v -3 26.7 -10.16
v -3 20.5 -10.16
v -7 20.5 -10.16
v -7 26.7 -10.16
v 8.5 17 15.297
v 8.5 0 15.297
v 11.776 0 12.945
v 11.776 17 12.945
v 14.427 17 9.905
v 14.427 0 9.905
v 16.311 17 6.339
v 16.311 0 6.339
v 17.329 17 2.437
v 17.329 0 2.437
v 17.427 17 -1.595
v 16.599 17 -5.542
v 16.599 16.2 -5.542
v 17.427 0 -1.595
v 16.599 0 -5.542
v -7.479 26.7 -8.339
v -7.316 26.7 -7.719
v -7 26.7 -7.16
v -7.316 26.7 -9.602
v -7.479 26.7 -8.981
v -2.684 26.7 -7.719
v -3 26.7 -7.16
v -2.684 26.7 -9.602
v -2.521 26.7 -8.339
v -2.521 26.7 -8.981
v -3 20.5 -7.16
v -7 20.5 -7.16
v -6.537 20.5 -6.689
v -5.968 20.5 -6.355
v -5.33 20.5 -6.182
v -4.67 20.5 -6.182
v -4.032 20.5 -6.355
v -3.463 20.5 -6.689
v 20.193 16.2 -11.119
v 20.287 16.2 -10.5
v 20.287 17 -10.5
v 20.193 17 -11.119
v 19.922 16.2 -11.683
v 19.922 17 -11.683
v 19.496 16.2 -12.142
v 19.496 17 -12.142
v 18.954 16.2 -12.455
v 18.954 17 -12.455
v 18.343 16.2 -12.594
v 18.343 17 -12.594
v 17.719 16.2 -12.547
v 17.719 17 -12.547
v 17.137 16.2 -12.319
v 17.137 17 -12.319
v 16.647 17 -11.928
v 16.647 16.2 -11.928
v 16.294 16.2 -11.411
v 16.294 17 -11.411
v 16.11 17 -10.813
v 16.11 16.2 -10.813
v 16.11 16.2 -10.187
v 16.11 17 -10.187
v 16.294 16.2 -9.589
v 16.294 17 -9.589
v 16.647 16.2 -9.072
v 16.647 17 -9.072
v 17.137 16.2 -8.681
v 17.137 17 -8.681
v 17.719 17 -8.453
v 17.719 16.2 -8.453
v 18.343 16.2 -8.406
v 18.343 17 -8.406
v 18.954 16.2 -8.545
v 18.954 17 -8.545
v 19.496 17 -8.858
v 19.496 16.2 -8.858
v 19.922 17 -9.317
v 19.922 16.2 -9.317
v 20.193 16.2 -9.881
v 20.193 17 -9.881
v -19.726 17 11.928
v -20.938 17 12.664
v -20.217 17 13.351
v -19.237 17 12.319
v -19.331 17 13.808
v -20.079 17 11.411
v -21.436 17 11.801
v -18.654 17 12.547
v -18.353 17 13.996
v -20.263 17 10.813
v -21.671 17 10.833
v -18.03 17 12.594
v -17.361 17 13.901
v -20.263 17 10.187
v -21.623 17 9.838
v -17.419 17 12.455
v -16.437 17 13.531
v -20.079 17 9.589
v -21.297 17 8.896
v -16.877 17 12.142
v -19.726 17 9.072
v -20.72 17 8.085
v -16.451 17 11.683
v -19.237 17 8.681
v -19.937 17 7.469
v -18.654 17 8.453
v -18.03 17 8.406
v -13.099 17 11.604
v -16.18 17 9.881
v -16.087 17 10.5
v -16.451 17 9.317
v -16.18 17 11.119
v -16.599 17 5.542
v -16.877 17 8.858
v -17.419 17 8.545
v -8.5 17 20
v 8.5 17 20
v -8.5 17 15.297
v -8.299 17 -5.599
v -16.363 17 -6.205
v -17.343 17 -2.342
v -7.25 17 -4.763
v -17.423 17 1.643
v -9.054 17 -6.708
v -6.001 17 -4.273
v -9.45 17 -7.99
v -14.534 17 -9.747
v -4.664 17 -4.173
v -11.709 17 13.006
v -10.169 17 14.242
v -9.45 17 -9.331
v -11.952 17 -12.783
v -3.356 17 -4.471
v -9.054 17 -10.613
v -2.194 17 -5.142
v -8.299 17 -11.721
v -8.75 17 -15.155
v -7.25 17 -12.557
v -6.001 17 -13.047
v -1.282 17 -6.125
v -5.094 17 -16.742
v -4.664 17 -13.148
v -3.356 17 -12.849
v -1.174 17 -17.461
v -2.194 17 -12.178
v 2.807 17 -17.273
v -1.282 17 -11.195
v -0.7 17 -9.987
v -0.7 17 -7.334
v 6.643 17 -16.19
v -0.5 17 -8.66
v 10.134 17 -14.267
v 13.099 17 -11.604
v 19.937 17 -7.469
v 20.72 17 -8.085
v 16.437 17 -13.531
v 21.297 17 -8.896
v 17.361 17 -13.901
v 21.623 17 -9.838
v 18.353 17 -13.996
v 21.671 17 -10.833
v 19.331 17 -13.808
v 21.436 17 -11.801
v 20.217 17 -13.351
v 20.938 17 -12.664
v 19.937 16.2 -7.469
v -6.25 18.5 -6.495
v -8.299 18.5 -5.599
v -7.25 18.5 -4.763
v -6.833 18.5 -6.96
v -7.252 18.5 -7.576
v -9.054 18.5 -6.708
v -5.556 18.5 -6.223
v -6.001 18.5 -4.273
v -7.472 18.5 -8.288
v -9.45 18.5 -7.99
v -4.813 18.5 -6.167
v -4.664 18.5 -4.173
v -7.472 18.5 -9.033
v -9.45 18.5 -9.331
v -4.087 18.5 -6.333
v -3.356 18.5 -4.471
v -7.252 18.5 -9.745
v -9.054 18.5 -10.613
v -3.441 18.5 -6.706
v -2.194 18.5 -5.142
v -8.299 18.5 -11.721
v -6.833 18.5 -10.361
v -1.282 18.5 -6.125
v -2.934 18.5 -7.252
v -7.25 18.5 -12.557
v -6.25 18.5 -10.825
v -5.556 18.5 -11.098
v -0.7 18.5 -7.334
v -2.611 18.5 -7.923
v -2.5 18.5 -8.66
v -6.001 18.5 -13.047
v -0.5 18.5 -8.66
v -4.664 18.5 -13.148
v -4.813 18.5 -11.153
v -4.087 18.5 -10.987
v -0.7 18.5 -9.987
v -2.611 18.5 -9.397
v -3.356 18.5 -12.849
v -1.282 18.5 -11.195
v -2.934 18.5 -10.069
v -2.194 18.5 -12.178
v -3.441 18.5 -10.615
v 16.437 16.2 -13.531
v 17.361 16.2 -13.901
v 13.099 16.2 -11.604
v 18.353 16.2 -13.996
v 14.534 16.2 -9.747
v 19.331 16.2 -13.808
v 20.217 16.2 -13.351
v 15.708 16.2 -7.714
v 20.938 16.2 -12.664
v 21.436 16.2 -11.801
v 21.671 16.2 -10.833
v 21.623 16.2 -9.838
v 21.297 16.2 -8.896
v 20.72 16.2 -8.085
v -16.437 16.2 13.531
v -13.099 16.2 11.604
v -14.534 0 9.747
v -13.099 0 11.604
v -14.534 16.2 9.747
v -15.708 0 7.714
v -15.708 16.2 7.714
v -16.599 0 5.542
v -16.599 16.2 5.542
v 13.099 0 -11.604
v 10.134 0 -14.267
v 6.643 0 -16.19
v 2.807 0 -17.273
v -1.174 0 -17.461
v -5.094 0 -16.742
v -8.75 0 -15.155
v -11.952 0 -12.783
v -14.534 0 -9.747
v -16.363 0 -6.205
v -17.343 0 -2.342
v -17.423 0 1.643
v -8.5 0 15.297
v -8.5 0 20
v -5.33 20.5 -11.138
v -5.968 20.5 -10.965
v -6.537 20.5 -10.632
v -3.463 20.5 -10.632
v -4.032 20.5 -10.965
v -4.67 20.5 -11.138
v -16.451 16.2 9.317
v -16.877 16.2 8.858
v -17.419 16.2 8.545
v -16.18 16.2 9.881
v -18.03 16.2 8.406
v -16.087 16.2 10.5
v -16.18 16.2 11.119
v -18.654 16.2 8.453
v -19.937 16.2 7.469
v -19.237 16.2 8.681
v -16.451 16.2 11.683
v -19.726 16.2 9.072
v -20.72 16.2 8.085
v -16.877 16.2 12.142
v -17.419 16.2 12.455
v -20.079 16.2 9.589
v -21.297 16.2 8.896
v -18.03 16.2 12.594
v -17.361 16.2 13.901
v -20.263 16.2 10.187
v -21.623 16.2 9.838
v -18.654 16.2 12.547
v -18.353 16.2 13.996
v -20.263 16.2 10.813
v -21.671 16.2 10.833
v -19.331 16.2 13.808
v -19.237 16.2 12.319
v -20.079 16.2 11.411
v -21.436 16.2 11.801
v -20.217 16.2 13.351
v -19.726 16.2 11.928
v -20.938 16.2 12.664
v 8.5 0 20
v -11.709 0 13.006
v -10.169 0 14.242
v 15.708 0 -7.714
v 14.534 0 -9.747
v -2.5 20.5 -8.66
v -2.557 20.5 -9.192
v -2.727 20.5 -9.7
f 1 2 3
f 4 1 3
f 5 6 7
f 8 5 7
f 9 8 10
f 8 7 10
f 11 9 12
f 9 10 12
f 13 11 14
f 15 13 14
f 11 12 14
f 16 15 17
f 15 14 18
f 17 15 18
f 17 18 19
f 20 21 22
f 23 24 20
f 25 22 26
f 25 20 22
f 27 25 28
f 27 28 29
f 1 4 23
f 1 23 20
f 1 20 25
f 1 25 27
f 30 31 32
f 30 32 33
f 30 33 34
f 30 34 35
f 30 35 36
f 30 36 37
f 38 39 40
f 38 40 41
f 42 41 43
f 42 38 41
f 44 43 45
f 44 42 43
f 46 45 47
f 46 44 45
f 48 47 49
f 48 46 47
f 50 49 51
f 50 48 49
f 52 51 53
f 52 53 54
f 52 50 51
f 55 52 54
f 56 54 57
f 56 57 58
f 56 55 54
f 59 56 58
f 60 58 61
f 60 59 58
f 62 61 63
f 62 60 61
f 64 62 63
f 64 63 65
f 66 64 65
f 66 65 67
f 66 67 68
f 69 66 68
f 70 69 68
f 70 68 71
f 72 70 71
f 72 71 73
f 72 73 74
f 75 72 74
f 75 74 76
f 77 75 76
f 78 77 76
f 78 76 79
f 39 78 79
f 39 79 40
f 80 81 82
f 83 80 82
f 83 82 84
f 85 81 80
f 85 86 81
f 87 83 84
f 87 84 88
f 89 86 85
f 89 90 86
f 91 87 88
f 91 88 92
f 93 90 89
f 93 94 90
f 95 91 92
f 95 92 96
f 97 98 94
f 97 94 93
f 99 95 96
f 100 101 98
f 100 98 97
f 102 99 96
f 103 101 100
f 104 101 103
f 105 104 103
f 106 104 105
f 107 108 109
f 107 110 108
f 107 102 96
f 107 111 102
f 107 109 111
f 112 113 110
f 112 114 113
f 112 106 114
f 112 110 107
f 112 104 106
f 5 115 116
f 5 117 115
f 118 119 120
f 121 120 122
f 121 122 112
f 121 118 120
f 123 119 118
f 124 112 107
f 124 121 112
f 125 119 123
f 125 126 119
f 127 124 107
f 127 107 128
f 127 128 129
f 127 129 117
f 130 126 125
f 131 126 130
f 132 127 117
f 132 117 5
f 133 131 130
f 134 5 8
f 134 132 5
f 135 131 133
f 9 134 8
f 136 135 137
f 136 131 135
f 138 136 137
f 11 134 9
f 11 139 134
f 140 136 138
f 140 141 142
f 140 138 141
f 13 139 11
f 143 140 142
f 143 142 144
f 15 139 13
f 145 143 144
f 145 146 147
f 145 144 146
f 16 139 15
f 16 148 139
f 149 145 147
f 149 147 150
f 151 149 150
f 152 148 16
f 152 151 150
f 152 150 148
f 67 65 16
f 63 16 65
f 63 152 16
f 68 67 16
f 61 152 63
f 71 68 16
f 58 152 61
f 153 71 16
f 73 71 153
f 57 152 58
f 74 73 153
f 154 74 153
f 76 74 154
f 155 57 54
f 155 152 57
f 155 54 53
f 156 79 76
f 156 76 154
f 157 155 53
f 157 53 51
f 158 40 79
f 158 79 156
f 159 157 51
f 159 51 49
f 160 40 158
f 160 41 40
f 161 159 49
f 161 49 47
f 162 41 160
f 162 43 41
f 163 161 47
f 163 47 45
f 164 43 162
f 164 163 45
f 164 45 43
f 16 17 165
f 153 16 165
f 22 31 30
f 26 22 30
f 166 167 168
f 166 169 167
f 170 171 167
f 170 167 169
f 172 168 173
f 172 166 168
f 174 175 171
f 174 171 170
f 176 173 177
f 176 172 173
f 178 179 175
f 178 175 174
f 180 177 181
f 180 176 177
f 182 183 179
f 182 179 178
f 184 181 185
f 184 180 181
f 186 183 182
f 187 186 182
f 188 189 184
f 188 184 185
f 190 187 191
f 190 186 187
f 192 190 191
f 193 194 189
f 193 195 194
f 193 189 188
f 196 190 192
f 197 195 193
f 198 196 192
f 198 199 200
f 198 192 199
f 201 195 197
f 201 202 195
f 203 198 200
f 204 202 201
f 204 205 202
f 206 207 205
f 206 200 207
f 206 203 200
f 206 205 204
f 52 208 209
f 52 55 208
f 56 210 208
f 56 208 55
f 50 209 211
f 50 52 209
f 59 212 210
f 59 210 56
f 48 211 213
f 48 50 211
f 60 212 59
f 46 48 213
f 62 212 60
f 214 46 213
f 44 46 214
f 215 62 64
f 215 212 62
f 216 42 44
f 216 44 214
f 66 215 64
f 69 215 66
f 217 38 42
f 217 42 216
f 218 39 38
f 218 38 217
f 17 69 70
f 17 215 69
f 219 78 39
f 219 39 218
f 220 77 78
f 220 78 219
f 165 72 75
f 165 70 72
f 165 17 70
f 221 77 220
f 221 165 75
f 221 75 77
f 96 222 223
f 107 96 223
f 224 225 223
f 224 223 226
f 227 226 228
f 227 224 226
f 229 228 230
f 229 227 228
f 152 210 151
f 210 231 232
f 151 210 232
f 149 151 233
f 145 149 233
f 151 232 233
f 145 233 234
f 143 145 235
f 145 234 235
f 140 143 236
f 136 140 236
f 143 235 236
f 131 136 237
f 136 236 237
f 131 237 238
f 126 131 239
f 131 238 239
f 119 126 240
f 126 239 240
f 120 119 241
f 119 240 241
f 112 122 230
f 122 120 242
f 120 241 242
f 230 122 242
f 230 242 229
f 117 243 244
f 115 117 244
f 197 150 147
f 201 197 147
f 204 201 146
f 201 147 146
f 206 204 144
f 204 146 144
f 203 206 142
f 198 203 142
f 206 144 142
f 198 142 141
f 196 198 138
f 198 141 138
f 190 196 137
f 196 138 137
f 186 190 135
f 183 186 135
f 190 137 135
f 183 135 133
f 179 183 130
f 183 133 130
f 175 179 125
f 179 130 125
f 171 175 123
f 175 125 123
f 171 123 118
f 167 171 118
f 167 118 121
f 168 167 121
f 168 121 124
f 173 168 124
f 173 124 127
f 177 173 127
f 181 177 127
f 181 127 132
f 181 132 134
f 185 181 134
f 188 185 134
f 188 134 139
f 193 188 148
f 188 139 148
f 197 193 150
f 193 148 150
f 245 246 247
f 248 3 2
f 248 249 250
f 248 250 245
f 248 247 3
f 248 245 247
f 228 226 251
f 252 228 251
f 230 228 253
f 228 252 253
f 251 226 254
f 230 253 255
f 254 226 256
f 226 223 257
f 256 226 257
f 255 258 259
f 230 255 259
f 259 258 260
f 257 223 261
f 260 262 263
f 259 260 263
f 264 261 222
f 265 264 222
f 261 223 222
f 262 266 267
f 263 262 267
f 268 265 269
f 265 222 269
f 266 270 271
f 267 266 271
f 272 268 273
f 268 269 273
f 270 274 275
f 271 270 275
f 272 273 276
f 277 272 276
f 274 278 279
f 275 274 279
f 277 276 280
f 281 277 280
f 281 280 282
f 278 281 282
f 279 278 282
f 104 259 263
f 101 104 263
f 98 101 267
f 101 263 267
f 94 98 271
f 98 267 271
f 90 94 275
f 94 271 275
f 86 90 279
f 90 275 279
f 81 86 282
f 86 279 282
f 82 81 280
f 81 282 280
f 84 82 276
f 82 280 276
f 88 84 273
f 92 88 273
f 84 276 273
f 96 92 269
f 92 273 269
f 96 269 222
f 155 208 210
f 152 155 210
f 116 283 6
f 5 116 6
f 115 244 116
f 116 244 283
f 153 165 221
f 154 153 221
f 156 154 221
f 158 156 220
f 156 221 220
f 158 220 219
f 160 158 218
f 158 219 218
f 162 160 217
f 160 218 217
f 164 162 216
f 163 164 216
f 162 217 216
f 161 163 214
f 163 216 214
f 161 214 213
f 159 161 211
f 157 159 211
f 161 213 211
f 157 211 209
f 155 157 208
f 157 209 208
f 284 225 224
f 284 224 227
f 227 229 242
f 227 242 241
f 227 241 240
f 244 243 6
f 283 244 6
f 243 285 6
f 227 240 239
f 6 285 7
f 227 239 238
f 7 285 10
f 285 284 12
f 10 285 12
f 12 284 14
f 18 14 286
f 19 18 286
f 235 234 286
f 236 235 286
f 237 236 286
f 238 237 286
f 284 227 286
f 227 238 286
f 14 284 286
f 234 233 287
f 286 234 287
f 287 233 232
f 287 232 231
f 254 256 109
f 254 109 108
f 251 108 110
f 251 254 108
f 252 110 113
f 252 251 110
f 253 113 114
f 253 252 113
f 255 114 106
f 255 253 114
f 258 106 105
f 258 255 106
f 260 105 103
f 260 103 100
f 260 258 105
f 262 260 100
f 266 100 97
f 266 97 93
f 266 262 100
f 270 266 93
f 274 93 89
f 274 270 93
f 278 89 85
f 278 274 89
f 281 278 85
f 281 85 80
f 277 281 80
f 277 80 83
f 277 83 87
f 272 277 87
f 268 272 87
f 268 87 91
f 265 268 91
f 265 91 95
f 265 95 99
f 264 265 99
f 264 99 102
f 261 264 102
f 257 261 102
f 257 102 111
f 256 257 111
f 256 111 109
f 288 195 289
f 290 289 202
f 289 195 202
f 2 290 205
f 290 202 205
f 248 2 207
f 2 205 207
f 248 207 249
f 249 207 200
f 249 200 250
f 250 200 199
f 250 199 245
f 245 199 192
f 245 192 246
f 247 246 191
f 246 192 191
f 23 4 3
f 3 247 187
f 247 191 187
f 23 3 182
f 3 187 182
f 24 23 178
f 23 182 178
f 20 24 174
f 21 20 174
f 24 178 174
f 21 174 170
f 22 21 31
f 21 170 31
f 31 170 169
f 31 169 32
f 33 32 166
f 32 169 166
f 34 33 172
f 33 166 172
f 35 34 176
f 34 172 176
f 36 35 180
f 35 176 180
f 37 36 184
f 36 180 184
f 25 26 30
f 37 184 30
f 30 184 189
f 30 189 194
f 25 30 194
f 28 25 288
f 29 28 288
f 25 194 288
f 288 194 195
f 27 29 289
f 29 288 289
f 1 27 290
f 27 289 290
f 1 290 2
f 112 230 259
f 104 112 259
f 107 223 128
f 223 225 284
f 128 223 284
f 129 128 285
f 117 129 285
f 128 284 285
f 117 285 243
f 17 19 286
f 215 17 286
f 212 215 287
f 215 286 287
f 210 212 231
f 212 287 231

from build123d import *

# Parameters (mm, degrees)
SKETCH1_R           = 2.1
BOSS_EXTRUDE2_DEPTH = 17
SKETCH4_R           = 4.5
BOSS_EXTRUDE3_DEPTH = 1.5
SKETCH5_R           = 2.5
BOSS_EXTRUDE4_DEPTH = 2
SKETCH8_R           = 2.1
CUT_EXTRUDE1_DEPTH  = 16.2
BOSS_EXTRUDE6_DEPTH = 6.2


with BuildPart() as part:
    # Sketch1 → Boss-Extrude2 (new body)
    with BuildSketch(Plane(origin=(0, 0, 0), x_dir=(1, 0, 0), z_dir=(0, 1, 0))):
        with BuildLine():
            Line((-8.5, -20), (8.5, -20))
            Line((8.5, -20), (8.5, -15.297058541))
            ThreePointArc((8.5, -15.297058541), (16.311372932, -6.339488392), (16.599242405, 5.542125186))
            Line((16.599242405, 5.542125186), (19.936533479, 7.468911087))
            ThreePointArc((19.936533479, 7.468911087), (21.217622393, 12.25), (16.436533479, 13.531088913))
            Line((16.436533479, 13.531088913), (13.099242405, 11.604303013))
            ThreePointArc((13.099242405, 11.604303013), (-8.75, 15.155444566), (-16.599242405, -5.542125186))
            Line((-16.599242405, -5.542125186), (-19.936533479, -7.468911087))
            ThreePointArc((-19.936533479, -7.468911087), (-21.217622393, -12.25), (-16.436533479, -13.531088913))
            Line((-16.436533479, -13.531088913), (-13.099242405, -11.604303013))
            ThreePointArc((-13.099242405, -11.604303013), (-10.956319134, -13.64584446), (-8.5, -15.297058541))
            Line((-8.5, -15.297058541), (-8.5, -20))
        make_face()
        with Locations((-18.186533479, -10.5)):
            Circle(SKETCH1_R, mode=Mode.SUBTRACT)
        with Locations((18.186533479, 10.5)):
            Circle(SKETCH1_R, mode=Mode.SUBTRACT)
    extrude(amount=BOSS_EXTRUDE2_DEPTH)

    # Sketch4 → Boss-Extrude3 (add)
    with BuildSketch(Plane(origin=(0, 17, 0), x_dir=(1, 0, 0), z_dir=(0, 1, 0))):
        with Locations((-5, 8.660254038)):
            Circle(SKETCH4_R)
    extrude(amount=BOSS_EXTRUDE3_DEPTH)

    # Sketch5 → Boss-Extrude4 (add)
    with BuildSketch(Plane(origin=(0, 18.5, 0), x_dir=(1, 0, 0), z_dir=(0, 1, 0))):
        with Locations((-5, 8.660254038)):
            Circle(SKETCH5_R)
    extrude(amount=BOSS_EXTRUDE4_DEPTH)

    # Sketch8 → Cut-Extrude1 (cut)
    with BuildSketch(Plane.XZ):
        with BuildLine():
            ThreePointArc((16.599242405, -5.542125186), (15.155444566, -8.75), (13.099242405, -11.604303013))
            Line((13.099242405, -11.604303013), (16.436533479, -13.531088913))
            ThreePointArc((16.436533479, -13.531088913), (21.217622393, -12.25), (19.936533479, -7.468911087))
            Line((19.936533479, -7.468911087), (16.599242405, -5.542125186))
        make_face()
        with Locations((18.186533479, -10.5)):
            Circle(SKETCH8_R, mode=Mode.SUBTRACT)
        with BuildLine():
            ThreePointArc((-13.099242405, 11.604303013), (-15.155444566, 8.75), (-16.599242405, 5.542125186))
            Line((-16.599242405, 5.542125186), (-19.936533479, 7.468911087))
            ThreePointArc((-19.936533479, 7.468911087), (-21.217622393, 12.25), (-16.436533479, 13.531088913))
            Line((-16.436533479, 13.531088913), (-13.099242405, 11.604303013))
        make_face()
        with Locations((-18.186533479, 10.5)):
            Circle(SKETCH8_R, mode=Mode.SUBTRACT)
    extrude(amount=-CUT_EXTRUDE1_DEPTH, mode=Mode.SUBTRACT)

    # Sketch9 → Boss-Extrude6 (add)
    with BuildSketch(Plane(origin=(0, 20.5, 0), x_dir=(1, 0, 0), z_dir=(0, 1, 0))):
        with BuildLine():
            Line((-7, 7.160254038), (-3, 7.160254038))
            ThreePointArc((-3, 7.160254038), (-2.5, 8.660254038), (-3, 10.160254038))
            Line((-3, 10.160254038), (-7, 10.160254038))
            ThreePointArc((-7, 10.160254038), (-7.5, 8.660254038), (-7, 7.160254038))
        make_face()
    extrude(amount=BOSS_EXTRUDE6_DEPTH)


solid = part.part
